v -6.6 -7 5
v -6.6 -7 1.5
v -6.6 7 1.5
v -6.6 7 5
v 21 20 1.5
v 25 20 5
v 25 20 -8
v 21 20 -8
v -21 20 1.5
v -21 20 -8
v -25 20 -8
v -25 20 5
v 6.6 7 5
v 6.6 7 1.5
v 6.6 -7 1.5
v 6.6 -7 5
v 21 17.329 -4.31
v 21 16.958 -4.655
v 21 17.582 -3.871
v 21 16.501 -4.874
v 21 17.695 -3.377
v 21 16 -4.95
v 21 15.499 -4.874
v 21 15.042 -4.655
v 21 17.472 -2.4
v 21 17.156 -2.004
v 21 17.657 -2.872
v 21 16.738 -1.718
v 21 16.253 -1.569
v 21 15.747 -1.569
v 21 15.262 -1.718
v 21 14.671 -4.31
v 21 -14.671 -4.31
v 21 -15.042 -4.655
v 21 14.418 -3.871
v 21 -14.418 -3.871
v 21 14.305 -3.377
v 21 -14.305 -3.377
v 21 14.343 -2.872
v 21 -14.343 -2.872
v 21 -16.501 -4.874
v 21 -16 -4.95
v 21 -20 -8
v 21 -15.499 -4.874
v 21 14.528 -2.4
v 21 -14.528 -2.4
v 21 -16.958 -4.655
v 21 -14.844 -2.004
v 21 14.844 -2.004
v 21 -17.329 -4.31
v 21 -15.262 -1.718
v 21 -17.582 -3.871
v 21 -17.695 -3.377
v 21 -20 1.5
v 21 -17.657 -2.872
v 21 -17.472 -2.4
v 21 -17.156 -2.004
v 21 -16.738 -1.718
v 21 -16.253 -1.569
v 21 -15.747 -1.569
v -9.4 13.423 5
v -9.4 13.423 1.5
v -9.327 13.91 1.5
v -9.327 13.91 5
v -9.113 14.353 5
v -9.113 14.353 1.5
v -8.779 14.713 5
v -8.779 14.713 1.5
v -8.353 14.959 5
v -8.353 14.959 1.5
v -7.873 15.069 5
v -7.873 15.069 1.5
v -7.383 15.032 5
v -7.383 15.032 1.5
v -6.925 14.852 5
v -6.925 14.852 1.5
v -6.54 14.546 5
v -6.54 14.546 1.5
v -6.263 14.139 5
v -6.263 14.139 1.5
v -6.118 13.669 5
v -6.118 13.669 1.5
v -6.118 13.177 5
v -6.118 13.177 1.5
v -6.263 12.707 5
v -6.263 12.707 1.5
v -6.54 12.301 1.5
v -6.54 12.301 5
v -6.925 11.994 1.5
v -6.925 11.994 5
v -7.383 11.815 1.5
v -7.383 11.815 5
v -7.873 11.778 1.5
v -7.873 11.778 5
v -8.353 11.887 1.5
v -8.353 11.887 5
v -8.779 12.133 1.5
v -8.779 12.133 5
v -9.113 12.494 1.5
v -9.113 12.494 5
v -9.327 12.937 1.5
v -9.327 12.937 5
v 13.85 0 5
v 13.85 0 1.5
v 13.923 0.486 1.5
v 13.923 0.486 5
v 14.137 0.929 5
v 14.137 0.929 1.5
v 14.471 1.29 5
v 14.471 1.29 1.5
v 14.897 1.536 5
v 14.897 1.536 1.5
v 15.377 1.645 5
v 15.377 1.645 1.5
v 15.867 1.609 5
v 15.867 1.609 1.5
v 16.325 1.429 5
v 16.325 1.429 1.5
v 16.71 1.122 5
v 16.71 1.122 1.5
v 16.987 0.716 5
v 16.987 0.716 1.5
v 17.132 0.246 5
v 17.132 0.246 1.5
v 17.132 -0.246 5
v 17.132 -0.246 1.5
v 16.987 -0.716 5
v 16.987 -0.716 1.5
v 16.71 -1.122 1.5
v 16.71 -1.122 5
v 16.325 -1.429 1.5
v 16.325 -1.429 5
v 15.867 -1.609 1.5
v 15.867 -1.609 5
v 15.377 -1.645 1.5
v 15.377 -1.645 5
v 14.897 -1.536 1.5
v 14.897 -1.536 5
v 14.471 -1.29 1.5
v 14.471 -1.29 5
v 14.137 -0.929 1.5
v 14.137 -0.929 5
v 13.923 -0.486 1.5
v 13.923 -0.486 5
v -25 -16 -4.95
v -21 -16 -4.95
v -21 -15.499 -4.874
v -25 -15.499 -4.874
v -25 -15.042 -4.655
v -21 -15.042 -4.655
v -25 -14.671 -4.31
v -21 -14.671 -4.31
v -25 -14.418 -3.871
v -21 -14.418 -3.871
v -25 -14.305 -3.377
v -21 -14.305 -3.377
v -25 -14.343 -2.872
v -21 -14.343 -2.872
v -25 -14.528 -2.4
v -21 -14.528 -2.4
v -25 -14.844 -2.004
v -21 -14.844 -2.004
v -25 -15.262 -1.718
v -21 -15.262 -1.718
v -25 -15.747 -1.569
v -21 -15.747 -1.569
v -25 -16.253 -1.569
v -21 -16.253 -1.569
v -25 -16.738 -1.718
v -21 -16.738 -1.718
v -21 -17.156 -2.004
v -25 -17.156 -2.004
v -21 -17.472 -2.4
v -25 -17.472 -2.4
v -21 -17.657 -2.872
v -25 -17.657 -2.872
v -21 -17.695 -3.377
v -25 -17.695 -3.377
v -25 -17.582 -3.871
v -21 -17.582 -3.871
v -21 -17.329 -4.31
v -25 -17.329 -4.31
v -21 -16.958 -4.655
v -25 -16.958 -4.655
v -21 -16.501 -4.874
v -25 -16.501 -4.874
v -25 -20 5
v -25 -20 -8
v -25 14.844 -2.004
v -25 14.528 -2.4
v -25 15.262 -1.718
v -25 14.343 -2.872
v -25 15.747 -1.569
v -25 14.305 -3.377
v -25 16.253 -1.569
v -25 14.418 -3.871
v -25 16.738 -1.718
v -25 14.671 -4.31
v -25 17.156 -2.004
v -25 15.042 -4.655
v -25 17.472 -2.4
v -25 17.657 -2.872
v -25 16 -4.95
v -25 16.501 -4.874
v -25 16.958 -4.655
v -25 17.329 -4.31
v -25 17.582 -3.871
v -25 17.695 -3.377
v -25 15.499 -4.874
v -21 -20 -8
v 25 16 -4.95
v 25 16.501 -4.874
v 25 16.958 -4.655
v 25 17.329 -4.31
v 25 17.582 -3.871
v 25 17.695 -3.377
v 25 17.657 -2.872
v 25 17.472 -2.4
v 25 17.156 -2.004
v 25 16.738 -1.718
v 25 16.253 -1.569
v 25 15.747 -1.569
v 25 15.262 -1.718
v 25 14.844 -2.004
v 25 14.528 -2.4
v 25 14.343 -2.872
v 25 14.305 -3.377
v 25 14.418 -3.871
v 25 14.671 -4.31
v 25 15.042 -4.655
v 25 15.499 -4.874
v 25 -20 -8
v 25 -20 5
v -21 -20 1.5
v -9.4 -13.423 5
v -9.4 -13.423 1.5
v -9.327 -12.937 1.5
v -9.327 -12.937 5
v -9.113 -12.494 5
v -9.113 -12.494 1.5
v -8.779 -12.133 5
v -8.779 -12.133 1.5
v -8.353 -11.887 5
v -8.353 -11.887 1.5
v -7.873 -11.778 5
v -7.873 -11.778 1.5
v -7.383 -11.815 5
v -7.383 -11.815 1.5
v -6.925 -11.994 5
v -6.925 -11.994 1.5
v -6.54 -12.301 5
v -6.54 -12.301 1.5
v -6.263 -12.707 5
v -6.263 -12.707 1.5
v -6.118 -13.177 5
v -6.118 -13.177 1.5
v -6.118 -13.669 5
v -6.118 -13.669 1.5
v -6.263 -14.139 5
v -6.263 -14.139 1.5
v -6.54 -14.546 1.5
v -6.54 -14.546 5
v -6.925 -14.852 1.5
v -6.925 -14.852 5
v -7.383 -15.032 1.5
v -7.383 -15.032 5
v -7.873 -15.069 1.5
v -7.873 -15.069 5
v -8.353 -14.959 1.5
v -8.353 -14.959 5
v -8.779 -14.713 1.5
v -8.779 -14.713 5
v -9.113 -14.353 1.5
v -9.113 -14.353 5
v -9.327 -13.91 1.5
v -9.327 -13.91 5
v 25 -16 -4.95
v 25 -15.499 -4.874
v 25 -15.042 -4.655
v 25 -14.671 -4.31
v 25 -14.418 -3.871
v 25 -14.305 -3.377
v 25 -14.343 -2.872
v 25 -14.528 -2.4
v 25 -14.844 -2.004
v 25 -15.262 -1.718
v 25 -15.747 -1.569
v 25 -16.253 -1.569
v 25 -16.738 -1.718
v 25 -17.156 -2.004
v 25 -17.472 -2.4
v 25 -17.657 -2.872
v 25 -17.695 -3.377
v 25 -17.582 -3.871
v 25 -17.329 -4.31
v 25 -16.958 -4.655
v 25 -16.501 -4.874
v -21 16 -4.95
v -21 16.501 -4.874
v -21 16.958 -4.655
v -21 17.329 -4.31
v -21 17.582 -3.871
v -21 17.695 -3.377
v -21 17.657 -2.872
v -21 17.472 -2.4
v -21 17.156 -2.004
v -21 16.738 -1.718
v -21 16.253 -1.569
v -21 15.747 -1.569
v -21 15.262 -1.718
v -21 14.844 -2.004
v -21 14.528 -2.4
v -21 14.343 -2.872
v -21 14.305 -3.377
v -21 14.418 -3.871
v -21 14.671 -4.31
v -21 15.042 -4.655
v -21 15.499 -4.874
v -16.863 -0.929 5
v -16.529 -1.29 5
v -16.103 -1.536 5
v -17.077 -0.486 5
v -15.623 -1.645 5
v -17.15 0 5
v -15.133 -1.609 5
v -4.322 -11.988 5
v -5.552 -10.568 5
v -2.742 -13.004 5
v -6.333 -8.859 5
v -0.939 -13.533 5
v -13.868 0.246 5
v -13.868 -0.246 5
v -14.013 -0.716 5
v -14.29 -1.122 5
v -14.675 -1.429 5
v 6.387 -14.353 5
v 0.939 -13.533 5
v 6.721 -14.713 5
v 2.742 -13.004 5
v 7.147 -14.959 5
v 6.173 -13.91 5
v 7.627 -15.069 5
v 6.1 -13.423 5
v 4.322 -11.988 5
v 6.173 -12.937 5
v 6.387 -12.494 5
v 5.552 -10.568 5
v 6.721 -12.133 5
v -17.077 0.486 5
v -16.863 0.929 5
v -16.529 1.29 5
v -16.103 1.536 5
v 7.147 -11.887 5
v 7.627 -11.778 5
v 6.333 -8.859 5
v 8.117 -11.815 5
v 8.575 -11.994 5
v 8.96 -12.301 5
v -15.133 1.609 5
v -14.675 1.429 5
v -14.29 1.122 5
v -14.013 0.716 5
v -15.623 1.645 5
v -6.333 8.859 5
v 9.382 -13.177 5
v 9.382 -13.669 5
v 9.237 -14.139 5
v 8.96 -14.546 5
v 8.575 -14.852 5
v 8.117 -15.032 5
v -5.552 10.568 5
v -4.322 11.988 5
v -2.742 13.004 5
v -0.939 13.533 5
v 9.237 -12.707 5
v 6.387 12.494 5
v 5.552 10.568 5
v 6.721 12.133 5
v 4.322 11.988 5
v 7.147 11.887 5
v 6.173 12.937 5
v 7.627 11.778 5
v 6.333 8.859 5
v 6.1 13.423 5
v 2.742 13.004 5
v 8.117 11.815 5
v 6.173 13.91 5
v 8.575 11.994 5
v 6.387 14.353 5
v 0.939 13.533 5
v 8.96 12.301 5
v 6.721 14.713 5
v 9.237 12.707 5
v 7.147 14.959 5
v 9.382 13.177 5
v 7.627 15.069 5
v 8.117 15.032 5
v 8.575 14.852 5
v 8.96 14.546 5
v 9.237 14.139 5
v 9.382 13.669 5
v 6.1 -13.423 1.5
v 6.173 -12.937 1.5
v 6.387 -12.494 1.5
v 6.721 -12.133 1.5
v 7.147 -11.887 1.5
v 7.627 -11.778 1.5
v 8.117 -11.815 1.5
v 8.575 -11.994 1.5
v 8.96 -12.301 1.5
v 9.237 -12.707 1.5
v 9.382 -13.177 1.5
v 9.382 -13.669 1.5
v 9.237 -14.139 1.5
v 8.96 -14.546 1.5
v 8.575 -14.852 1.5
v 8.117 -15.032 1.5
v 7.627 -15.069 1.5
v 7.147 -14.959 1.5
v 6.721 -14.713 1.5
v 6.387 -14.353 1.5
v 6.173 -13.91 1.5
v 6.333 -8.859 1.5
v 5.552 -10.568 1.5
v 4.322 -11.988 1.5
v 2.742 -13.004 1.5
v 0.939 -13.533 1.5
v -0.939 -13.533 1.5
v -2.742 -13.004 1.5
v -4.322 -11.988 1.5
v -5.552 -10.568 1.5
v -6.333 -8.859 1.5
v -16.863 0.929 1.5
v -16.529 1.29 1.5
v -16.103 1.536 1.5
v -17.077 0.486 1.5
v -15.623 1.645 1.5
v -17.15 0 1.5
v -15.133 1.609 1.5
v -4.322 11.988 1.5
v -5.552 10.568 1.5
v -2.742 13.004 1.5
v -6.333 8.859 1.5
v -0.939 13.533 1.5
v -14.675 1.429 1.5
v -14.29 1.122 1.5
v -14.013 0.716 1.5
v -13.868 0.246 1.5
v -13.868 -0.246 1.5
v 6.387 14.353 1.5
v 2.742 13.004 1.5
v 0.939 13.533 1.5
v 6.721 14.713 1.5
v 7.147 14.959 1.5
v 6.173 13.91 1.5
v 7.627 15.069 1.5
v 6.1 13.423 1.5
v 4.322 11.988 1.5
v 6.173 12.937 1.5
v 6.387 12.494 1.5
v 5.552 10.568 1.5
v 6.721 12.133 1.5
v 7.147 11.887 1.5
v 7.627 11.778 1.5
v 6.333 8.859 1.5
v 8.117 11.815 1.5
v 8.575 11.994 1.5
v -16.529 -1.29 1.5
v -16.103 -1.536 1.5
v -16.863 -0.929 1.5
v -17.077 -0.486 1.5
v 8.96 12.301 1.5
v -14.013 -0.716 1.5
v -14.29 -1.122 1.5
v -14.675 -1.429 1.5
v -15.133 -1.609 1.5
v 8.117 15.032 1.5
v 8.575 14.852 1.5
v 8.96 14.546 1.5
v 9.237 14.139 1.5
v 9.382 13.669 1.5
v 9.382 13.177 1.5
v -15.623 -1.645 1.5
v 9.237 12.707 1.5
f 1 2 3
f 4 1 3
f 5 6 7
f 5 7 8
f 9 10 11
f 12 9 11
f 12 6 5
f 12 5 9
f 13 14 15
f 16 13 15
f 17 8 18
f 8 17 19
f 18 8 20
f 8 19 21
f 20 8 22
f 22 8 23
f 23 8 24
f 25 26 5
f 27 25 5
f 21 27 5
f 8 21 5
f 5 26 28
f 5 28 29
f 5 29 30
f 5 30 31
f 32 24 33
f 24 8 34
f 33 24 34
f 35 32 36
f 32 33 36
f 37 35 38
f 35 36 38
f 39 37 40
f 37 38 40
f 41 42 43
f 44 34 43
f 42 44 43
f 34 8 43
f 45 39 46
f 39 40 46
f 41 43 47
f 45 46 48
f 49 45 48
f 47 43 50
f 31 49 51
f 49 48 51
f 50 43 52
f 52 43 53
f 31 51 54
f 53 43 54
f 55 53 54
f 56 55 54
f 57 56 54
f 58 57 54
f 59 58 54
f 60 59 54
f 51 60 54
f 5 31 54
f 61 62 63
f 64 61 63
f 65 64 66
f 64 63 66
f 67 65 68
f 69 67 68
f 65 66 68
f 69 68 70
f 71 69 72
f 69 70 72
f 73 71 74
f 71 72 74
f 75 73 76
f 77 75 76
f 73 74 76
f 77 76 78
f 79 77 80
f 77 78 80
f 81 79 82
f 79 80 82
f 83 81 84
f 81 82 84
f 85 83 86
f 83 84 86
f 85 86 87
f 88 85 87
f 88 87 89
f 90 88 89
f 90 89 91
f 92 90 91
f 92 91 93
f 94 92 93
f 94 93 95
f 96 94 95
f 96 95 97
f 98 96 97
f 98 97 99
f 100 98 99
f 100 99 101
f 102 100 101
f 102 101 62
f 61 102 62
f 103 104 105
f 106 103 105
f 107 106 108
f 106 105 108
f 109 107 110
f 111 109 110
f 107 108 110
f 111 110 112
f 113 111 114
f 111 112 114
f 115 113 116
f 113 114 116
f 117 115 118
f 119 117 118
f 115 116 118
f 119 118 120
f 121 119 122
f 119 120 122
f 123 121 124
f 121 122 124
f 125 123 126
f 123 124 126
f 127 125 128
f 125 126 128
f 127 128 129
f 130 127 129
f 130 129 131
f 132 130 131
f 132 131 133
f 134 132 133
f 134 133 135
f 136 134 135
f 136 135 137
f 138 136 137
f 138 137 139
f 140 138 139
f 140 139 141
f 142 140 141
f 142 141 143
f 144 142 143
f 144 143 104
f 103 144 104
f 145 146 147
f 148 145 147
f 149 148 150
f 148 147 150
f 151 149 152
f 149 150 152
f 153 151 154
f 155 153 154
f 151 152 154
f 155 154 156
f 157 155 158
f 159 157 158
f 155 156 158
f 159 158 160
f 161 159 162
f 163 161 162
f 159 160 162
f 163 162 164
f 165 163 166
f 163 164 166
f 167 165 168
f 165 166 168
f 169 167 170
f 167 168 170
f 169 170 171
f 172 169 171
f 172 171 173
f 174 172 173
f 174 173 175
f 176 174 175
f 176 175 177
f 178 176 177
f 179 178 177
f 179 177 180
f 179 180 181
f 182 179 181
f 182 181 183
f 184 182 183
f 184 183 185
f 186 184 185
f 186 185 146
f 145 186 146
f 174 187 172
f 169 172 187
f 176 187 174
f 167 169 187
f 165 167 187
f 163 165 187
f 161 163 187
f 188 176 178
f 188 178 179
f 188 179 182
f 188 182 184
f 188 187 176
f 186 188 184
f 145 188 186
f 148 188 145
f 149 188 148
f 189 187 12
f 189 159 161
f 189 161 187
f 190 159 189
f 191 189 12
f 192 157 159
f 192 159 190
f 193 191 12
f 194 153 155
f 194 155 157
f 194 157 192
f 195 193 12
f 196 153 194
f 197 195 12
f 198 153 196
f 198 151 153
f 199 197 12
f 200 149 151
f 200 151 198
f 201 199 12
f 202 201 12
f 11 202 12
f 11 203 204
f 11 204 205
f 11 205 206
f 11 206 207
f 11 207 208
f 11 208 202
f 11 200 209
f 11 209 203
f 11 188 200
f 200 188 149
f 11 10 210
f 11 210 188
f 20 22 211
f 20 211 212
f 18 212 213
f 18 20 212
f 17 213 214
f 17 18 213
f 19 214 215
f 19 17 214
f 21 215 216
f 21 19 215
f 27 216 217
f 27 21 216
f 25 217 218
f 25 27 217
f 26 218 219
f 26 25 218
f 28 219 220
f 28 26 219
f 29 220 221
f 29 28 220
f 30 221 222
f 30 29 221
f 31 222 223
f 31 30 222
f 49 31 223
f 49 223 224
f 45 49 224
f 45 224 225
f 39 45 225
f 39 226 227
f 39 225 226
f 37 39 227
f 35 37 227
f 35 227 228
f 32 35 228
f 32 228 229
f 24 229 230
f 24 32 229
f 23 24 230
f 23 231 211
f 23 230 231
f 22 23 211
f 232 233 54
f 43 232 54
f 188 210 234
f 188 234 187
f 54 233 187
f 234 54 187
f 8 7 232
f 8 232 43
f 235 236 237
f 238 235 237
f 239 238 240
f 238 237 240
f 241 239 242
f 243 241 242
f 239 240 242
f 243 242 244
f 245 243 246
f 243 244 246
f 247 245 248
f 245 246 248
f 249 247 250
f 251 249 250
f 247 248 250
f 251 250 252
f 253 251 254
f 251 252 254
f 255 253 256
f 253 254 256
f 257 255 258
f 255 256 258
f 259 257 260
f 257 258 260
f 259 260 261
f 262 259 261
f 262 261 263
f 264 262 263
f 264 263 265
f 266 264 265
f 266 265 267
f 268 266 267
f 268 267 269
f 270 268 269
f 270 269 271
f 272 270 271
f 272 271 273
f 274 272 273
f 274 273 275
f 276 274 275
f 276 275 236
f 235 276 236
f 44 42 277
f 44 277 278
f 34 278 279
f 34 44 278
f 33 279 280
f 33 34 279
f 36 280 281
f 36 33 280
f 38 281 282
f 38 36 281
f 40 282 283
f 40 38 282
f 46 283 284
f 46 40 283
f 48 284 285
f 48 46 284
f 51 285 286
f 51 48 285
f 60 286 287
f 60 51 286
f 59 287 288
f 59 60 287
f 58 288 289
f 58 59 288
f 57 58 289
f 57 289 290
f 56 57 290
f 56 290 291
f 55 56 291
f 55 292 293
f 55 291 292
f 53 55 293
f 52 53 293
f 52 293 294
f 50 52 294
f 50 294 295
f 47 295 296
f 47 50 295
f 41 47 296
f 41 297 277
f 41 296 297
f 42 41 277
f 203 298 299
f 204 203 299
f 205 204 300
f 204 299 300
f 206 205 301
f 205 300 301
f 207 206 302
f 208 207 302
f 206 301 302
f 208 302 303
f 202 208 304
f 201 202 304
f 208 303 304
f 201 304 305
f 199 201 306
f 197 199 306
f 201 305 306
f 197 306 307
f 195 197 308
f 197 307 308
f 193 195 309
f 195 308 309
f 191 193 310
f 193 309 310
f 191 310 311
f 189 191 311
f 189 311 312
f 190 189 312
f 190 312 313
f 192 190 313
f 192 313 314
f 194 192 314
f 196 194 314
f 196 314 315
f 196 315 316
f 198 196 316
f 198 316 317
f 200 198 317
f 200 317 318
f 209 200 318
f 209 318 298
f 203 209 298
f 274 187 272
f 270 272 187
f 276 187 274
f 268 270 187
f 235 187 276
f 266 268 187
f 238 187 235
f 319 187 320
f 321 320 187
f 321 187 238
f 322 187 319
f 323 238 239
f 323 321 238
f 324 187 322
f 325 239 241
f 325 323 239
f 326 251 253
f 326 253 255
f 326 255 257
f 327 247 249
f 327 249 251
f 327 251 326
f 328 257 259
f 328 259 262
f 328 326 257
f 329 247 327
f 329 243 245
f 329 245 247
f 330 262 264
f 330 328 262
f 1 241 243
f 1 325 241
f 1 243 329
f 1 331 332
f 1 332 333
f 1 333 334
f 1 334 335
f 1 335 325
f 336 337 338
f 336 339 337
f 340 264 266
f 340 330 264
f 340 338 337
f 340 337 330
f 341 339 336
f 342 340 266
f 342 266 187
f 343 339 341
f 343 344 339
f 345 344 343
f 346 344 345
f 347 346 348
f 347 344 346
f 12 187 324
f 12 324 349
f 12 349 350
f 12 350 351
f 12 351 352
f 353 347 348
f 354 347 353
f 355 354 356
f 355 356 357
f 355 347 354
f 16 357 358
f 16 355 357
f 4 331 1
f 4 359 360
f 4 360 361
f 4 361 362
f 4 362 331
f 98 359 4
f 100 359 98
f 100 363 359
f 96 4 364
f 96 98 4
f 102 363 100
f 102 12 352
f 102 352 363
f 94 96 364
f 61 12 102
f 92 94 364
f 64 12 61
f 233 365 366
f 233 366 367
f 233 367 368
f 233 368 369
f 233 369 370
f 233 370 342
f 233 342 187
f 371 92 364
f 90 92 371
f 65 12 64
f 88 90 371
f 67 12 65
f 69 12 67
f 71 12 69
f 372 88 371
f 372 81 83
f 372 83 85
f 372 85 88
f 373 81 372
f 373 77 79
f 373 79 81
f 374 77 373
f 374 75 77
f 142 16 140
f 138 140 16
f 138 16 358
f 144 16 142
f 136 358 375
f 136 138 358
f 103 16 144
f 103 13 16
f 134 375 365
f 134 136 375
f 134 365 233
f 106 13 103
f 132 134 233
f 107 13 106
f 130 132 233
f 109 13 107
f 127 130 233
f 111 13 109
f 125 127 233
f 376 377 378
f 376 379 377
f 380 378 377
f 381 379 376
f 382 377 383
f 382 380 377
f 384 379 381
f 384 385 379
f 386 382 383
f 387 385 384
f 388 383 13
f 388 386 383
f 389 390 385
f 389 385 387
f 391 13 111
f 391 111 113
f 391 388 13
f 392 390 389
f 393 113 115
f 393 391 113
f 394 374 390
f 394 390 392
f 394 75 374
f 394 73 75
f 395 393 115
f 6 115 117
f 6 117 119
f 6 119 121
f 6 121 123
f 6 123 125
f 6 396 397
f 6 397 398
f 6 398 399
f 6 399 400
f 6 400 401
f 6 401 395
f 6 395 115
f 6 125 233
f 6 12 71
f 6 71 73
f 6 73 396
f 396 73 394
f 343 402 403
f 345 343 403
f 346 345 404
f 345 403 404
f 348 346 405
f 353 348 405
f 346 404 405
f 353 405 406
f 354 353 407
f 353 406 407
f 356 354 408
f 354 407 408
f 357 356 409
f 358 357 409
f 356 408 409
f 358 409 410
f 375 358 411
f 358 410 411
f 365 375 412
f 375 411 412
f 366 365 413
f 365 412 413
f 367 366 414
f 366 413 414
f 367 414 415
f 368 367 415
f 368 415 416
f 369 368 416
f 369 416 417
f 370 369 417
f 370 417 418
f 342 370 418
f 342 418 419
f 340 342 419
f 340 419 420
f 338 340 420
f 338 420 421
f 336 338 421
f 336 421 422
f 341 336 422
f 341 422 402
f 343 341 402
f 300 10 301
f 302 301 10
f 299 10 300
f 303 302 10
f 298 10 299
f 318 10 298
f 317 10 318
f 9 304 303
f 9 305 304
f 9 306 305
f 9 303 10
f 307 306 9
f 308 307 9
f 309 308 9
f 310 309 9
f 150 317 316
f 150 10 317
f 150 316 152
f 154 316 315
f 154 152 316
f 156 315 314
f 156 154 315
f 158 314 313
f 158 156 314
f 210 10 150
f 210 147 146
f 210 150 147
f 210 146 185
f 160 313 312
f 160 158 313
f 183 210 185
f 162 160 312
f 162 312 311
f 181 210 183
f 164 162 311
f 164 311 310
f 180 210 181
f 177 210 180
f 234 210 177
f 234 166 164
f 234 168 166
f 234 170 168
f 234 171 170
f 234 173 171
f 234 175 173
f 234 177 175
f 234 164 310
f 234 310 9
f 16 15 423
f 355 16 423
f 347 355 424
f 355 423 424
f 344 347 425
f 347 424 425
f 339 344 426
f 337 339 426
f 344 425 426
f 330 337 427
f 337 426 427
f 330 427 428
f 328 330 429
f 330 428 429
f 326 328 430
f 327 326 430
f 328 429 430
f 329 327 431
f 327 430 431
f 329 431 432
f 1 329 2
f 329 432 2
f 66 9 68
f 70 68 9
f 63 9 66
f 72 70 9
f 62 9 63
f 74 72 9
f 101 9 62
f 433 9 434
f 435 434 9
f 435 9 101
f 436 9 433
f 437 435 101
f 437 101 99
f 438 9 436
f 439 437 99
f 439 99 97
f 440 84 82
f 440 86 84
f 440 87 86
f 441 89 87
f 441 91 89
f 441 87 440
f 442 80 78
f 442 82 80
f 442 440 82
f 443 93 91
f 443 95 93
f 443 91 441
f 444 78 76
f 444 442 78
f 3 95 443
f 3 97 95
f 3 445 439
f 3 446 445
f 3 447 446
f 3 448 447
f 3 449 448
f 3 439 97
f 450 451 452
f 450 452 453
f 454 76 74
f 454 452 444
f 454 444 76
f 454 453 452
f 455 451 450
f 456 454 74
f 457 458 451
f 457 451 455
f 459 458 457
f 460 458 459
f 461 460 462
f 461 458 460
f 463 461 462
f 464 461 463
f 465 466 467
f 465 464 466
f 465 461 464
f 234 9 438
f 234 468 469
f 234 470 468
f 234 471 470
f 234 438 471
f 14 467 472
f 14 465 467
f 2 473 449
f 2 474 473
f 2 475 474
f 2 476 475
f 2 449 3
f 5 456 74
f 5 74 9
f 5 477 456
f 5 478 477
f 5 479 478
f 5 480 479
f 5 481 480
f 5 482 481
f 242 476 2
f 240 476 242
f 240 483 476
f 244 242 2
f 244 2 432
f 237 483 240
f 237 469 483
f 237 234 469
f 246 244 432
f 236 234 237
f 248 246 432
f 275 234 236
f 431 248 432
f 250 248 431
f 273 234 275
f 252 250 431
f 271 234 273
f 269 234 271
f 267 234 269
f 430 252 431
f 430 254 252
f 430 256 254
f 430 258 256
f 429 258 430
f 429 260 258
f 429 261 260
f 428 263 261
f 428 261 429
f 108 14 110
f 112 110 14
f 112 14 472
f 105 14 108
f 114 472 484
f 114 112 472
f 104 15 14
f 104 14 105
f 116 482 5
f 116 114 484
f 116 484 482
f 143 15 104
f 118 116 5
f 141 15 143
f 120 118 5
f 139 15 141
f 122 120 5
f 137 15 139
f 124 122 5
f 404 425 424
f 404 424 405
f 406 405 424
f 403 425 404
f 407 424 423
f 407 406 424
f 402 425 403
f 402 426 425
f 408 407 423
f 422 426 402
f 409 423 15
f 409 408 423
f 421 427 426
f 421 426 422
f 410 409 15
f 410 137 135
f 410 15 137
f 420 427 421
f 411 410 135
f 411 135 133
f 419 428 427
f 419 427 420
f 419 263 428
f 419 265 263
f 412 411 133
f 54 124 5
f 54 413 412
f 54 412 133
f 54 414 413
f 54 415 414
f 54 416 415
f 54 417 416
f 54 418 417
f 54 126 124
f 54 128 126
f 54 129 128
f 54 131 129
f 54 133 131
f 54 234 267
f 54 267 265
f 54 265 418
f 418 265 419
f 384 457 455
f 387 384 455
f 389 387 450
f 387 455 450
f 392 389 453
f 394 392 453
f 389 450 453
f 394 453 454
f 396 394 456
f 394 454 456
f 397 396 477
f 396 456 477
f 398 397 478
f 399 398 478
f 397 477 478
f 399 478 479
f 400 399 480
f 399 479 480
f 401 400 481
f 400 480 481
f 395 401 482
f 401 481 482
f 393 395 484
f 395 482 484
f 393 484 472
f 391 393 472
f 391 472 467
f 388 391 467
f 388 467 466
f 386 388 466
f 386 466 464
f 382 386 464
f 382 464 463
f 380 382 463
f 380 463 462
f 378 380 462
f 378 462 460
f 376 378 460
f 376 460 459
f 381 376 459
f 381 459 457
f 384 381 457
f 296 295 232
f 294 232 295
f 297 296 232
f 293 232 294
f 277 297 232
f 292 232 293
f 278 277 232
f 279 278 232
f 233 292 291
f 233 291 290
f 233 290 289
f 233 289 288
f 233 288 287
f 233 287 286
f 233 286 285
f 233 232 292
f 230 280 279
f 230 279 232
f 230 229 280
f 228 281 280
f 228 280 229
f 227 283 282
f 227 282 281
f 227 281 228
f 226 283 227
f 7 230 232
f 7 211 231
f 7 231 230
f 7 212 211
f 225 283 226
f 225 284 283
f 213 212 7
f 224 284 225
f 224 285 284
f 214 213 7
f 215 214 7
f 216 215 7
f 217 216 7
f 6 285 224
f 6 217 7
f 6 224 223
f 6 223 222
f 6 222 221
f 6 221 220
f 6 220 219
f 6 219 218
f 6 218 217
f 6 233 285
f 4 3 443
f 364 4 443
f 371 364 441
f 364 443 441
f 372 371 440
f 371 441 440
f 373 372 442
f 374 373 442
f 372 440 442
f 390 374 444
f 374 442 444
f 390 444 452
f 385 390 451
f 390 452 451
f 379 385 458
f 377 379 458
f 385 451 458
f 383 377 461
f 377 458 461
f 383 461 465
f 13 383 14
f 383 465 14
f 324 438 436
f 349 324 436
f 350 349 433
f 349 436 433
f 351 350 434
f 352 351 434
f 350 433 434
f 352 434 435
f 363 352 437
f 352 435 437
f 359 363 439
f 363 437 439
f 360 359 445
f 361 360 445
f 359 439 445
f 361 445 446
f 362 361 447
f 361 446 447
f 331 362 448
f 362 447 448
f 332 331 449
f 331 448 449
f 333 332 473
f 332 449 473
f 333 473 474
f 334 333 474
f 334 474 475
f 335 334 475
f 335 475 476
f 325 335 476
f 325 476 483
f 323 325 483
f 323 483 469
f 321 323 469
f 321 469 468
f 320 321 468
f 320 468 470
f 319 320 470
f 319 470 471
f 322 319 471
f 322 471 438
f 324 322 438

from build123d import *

# Parameters (mm, degrees)
SKETCH_1_W               = 50
SKETCH_1_H               = 40
EXTRUDE_1_DEPTH          = 5
SKETCH_2_W               = 6
SKETCH_2_H               = 40
EXTRUDE_2_DEPTH          = 8
SKETCH_3_R               = 1.65
CUT_EXTRUDE_1_DEPTH      = 6
SKETCH_4_W               = 38
SKETCH_4_H               = 40
CUT_EXTRUDE_2_DEPTH      = 1.5
SKETCH_6_R               = 1.7
CUT_EXTRUDE_3_DEPTH      = 45
CUT_EXTRUDE_3_DEPTH_BACK = 7
SKETCH_7_W               = 42
SKETCH_7_H               = 9.5
CUT_EXTRUDE_4_DEPTH      = 41


with BuildPart() as part:
    # 草图1 → 凸台-拉伸1 (new body)
    with BuildSketch(Plane.XY):
        Rectangle(SKETCH_1_W, SKETCH_1_H)
    extrude(amount=EXTRUDE_1_DEPTH)

    # 草图2 → 凸台-拉伸2 (add)
    with BuildSketch(Plane(origin=(0, 0, 0), x_dir=(-1, 0, 0), z_dir=(0, 0, -1))):
        with Locations((-22, 0)):
            Rectangle(SKETCH_2_W, SKETCH_2_H)
        with Locations((22, 0)):
            Rectangle(SKETCH_2_W, SKETCH_2_H)
    extrude(amount=EXTRUDE_2_DEPTH)

    # 草图3 → 切除-拉伸1 (cut, through all)
    with BuildSketch(Plane(origin=(0, 0, 0), x_dir=(-1, 0, 0), z_dir=(0, 0, -1))):
        with Locations((-15.5, 0)):
            Circle(SKETCH_3_R)
        with Locations((-7.75, 13.423393759)):
            Circle(SKETCH_3_R)
        with Locations((7.75, 13.423393759)):
            Circle(SKETCH_3_R)
        with Locations((15.5, 0)):
            Circle(SKETCH_3_R)
        with Locations((7.75, -13.423393759)):
            Circle(SKETCH_3_R)
        with Locations((-7.75, -13.423393759)):
            Circle(SKETCH_3_R)
        with BuildLine():
            Line((-6.6, 7), (-6.6, -7))
            ThreePointArc((-6.6, -7), (0, -13.6), (6.6, -7))
            Line((6.6, -7), (6.6, 7))
            ThreePointArc((6.6, 7), (0, 13.6), (-6.6, 7))
        make_face()
    extrude(amount=-CUT_EXTRUDE_1_DEPTH, mode=Mode.SUBTRACT)

    # 草图4 → 切除-拉伸2 (cut)
    with BuildSketch(Plane(origin=(0, 0, 0), x_dir=(-1, 0, 0), z_dir=(0, 0, -1))):
        Rectangle(SKETCH_4_W, SKETCH_4_H)
    extrude(amount=-CUT_EXTRUDE_2_DEPTH, mode=Mode.SUBTRACT)

    # 草图6 → 切除-拉伸3 (cut, two sides)
    with BuildSketch(Plane(origin=(-19, 0, 0), x_dir=(0, 0, -1), z_dir=(1, 0, 0))) as cut_extrude_3_sk:
        with Locations((3.25, 16)):
            Circle(SKETCH_6_R)
        with Locations((3.25, -16)):
            Circle(SKETCH_6_R)
    extrude(amount=CUT_EXTRUDE_3_DEPTH, mode=Mode.SUBTRACT)
    extrude(cut_extrude_3_sk.sketch, amount=-CUT_EXTRUDE_3_DEPTH_BACK, mode=Mode.SUBTRACT)

    # 草图7 → 切除-拉伸4 (cut, through all)
    with BuildSketch(Plane.XZ.offset(20)):
        with Locations((0, -3.25)):
            Rectangle(SKETCH_7_W, SKETCH_7_H)
    extrude(amount=-CUT_EXTRUDE_4_DEPTH, mode=Mode.SUBTRACT)


solid = part.part
